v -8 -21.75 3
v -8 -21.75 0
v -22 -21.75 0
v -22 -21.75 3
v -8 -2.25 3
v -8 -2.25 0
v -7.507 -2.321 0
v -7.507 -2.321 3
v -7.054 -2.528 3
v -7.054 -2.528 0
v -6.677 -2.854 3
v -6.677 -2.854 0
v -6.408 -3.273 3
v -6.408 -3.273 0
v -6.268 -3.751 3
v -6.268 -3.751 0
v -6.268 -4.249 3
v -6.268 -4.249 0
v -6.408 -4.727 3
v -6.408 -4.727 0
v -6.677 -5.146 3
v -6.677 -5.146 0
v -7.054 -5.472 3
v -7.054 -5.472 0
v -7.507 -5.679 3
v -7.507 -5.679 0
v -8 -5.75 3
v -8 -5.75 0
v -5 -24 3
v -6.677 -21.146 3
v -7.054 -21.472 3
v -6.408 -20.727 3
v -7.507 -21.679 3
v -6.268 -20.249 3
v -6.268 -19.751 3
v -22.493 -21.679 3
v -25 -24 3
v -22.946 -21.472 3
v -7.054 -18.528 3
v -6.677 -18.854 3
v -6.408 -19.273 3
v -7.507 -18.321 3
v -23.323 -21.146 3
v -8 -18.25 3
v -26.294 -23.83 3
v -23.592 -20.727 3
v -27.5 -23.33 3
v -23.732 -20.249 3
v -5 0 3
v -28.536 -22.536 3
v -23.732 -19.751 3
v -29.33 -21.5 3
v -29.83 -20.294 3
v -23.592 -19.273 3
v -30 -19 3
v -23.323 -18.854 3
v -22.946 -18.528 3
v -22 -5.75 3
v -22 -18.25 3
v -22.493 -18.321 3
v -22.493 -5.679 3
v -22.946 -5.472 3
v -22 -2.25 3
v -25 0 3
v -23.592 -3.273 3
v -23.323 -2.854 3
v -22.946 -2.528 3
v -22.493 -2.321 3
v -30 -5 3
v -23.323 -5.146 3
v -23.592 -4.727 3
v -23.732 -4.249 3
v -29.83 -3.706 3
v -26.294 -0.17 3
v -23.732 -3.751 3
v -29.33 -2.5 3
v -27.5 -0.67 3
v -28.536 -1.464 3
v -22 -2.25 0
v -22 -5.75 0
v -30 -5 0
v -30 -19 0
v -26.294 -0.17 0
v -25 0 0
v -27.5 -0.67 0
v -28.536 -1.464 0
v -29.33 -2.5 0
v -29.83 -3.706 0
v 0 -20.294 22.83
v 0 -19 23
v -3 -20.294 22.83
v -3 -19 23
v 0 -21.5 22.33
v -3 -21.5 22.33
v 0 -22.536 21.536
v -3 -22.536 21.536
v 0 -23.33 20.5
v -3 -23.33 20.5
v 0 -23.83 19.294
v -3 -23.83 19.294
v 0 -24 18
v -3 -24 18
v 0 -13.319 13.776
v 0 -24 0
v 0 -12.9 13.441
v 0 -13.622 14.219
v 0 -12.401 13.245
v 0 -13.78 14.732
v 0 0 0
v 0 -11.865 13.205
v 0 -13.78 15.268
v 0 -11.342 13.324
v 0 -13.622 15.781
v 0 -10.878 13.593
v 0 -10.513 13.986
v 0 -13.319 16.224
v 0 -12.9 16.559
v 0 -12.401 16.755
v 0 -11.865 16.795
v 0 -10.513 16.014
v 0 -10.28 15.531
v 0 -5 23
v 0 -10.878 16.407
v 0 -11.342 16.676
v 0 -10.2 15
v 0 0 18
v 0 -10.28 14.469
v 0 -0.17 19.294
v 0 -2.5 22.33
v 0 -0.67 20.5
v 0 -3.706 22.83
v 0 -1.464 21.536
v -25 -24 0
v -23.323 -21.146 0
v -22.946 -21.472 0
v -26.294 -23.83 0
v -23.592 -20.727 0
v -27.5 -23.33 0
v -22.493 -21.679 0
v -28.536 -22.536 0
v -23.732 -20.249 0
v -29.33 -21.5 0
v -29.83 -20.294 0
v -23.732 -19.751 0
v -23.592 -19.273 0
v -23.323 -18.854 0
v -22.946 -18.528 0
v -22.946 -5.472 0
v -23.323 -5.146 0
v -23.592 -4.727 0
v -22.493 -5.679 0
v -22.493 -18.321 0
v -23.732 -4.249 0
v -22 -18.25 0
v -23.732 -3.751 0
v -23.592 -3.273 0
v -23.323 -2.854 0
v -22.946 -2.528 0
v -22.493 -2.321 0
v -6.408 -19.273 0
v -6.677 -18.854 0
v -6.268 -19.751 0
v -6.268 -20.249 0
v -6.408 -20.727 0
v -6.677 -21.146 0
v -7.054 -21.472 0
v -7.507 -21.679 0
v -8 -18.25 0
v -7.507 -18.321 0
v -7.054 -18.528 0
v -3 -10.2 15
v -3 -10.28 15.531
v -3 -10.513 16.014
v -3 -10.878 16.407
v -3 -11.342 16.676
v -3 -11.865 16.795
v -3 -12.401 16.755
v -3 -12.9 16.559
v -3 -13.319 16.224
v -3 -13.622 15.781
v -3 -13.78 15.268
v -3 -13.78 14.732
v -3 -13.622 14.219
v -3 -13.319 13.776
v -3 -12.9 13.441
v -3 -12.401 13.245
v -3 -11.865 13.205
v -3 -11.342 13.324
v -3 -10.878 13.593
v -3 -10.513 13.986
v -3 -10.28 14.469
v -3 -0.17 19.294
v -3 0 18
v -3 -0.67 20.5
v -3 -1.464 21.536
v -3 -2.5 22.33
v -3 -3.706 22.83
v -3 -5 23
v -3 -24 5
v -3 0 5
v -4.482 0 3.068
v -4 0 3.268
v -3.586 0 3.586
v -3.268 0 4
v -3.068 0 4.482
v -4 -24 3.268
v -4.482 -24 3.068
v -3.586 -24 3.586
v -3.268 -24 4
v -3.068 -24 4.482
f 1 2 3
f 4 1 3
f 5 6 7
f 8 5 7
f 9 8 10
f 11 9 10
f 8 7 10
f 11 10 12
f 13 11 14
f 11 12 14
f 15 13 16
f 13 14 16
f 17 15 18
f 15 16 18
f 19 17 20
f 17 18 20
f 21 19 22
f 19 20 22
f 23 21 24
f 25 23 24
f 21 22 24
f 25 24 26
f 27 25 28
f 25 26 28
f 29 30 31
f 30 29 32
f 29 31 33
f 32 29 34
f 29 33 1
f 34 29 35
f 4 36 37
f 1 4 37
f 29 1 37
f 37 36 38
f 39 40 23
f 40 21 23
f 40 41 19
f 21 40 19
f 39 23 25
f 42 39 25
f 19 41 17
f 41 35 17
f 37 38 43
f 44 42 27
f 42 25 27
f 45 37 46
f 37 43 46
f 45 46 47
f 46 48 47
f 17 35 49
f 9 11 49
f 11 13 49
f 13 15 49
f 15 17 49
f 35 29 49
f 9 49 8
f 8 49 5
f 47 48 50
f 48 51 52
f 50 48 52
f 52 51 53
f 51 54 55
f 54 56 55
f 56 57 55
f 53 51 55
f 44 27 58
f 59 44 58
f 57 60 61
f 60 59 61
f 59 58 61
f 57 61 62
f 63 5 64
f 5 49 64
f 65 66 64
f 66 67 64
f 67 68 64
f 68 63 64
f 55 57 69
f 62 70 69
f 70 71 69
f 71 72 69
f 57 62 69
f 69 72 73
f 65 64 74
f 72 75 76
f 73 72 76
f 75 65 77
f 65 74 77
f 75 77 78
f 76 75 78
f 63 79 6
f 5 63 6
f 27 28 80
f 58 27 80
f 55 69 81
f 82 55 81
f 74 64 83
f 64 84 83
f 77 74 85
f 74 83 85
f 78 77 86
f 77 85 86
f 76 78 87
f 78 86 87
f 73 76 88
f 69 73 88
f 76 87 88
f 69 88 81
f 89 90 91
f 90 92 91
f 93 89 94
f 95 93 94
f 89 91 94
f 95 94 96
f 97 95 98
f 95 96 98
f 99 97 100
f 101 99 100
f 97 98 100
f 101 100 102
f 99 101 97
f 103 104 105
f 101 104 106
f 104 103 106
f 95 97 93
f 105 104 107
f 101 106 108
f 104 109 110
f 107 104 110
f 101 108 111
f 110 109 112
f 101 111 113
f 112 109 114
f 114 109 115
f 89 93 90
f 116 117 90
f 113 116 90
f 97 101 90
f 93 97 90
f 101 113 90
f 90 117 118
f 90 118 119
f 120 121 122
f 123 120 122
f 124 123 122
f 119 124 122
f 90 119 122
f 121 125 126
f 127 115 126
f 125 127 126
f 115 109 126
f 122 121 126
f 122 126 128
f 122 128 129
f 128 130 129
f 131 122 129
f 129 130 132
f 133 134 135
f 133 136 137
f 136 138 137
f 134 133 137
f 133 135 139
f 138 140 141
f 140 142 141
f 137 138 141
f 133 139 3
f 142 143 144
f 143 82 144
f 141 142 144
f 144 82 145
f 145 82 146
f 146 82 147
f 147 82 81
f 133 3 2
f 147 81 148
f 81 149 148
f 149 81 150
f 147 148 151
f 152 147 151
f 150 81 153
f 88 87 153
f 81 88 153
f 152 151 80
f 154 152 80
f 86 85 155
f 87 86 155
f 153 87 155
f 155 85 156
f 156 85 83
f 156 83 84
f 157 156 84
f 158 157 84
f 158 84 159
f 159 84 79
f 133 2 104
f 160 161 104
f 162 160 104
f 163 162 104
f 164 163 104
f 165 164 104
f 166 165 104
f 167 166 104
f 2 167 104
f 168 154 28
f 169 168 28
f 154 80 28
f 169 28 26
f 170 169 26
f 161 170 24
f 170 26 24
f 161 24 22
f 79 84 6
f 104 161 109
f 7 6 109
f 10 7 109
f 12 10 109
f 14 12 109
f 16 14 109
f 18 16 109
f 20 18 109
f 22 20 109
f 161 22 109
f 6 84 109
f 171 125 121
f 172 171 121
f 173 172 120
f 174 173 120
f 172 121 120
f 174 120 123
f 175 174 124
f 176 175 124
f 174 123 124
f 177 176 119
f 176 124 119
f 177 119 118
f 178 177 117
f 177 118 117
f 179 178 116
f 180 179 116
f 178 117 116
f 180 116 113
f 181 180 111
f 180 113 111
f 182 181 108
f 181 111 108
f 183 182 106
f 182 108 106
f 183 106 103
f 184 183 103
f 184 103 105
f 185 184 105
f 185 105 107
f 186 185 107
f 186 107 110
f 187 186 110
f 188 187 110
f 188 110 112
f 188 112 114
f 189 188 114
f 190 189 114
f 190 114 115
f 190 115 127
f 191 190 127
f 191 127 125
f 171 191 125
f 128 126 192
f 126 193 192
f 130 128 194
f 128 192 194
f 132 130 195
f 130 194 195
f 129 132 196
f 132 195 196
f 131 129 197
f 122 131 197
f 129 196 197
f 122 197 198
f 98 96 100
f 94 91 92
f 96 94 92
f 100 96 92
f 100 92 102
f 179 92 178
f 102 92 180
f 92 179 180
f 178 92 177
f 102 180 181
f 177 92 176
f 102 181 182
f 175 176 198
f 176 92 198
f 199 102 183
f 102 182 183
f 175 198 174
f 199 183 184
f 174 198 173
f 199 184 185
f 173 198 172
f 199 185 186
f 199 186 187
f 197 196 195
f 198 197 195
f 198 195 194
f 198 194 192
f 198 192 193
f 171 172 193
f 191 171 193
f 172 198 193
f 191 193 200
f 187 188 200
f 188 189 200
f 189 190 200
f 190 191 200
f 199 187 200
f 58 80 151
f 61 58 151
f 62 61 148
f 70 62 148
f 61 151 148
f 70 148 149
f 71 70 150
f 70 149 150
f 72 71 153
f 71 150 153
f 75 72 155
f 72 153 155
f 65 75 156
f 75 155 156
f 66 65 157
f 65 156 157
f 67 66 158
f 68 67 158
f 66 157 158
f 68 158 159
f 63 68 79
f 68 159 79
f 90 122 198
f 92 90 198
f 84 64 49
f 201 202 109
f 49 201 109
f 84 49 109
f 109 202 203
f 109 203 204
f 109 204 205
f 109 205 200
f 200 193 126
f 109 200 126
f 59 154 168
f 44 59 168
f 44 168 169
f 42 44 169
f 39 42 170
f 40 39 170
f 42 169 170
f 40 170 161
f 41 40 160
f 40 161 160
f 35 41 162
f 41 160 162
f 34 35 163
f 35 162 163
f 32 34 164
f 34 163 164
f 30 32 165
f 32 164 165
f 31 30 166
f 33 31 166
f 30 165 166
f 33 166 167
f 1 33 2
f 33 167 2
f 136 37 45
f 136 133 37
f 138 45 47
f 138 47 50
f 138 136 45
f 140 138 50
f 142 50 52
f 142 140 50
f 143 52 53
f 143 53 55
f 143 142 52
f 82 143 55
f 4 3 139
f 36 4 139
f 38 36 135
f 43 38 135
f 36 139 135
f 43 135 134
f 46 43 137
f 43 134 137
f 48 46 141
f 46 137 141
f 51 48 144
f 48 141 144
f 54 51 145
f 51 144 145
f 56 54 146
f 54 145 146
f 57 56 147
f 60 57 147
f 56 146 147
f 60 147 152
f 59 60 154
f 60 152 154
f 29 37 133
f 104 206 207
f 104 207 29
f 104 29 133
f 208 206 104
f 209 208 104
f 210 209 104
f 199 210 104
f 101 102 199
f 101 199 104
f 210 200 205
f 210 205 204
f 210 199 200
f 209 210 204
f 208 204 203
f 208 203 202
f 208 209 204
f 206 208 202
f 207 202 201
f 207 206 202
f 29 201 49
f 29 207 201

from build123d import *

# Parameters (mm, degrees)
F1_DEPTH = 24
F2_R     = 2
F3_R     = 1.8
F4_DEPTH = 30.001
F5_R     = 5
F7_DEPTH = 23.001


with BuildPart() as f1:
    # F0 (on Front) → F1 (new body)
    with BuildSketch(Plane.XZ):
        Polygon((-30, 0), (0, 0), (0, 23), (-3, 23), (-3, 3), (-30, 3), align=None)
    extrude(amount=F1_DEPTH)

    # F2
    f2_edges = [f1.edges().sort_by_distance(p)[0] for p in [
        (-3, -12, 3),
    ]]
    fillet(f2_edges, radius=F2_R)

    # F3 (on face) → F4 (cut, through all)
    with BuildSketch(Plane.YZ):
        with Locations((-12, 15)):
            Circle(F3_R)
    extrude(amount=-F4_DEPTH, mode=Mode.SUBTRACT)

    # F5
    f5_edges = [f1.edges().sort_by_distance(p)[0] for p in [
        (-1.5, -24, 23),
        (-1.5, 0, 23),
        (-30, -24, 1.5),
        (-30, 0, 1.5),
    ]]
    fillet(f5_edges, radius=F5_R)

    # F6 (on face) → F7 (cut, through all)
    with BuildSketch(Plane(origin=(0, 0, 0), x_dir=(1, 0, 0), z_dir=(0, 0, -1))):
        with BuildLine():
            ThreePointArc((-8, 18.25), (-6.25, 20), (-8, 21.75))
            Line((-8, 21.75), (-22, 21.75))
            ThreePointArc((-22, 21.75), (-23.75, 20), (-22, 18.25))
            Line((-22, 18.25), (-8, 18.25))
        make_face()
        with BuildLine():
            Line((-22, 2.25), (-8, 2.25))
            ThreePointArc((-8, 2.25), (-6.25, 4), (-8, 5.75))
            Line((-8, 5.75), (-22, 5.75))
            ThreePointArc((-22, 5.75), (-23.75, 4), (-22, 2.25))
        make_face()
    extrude(amount=-F7_DEPTH, mode=Mode.SUBTRACT)


solid = f1.part
